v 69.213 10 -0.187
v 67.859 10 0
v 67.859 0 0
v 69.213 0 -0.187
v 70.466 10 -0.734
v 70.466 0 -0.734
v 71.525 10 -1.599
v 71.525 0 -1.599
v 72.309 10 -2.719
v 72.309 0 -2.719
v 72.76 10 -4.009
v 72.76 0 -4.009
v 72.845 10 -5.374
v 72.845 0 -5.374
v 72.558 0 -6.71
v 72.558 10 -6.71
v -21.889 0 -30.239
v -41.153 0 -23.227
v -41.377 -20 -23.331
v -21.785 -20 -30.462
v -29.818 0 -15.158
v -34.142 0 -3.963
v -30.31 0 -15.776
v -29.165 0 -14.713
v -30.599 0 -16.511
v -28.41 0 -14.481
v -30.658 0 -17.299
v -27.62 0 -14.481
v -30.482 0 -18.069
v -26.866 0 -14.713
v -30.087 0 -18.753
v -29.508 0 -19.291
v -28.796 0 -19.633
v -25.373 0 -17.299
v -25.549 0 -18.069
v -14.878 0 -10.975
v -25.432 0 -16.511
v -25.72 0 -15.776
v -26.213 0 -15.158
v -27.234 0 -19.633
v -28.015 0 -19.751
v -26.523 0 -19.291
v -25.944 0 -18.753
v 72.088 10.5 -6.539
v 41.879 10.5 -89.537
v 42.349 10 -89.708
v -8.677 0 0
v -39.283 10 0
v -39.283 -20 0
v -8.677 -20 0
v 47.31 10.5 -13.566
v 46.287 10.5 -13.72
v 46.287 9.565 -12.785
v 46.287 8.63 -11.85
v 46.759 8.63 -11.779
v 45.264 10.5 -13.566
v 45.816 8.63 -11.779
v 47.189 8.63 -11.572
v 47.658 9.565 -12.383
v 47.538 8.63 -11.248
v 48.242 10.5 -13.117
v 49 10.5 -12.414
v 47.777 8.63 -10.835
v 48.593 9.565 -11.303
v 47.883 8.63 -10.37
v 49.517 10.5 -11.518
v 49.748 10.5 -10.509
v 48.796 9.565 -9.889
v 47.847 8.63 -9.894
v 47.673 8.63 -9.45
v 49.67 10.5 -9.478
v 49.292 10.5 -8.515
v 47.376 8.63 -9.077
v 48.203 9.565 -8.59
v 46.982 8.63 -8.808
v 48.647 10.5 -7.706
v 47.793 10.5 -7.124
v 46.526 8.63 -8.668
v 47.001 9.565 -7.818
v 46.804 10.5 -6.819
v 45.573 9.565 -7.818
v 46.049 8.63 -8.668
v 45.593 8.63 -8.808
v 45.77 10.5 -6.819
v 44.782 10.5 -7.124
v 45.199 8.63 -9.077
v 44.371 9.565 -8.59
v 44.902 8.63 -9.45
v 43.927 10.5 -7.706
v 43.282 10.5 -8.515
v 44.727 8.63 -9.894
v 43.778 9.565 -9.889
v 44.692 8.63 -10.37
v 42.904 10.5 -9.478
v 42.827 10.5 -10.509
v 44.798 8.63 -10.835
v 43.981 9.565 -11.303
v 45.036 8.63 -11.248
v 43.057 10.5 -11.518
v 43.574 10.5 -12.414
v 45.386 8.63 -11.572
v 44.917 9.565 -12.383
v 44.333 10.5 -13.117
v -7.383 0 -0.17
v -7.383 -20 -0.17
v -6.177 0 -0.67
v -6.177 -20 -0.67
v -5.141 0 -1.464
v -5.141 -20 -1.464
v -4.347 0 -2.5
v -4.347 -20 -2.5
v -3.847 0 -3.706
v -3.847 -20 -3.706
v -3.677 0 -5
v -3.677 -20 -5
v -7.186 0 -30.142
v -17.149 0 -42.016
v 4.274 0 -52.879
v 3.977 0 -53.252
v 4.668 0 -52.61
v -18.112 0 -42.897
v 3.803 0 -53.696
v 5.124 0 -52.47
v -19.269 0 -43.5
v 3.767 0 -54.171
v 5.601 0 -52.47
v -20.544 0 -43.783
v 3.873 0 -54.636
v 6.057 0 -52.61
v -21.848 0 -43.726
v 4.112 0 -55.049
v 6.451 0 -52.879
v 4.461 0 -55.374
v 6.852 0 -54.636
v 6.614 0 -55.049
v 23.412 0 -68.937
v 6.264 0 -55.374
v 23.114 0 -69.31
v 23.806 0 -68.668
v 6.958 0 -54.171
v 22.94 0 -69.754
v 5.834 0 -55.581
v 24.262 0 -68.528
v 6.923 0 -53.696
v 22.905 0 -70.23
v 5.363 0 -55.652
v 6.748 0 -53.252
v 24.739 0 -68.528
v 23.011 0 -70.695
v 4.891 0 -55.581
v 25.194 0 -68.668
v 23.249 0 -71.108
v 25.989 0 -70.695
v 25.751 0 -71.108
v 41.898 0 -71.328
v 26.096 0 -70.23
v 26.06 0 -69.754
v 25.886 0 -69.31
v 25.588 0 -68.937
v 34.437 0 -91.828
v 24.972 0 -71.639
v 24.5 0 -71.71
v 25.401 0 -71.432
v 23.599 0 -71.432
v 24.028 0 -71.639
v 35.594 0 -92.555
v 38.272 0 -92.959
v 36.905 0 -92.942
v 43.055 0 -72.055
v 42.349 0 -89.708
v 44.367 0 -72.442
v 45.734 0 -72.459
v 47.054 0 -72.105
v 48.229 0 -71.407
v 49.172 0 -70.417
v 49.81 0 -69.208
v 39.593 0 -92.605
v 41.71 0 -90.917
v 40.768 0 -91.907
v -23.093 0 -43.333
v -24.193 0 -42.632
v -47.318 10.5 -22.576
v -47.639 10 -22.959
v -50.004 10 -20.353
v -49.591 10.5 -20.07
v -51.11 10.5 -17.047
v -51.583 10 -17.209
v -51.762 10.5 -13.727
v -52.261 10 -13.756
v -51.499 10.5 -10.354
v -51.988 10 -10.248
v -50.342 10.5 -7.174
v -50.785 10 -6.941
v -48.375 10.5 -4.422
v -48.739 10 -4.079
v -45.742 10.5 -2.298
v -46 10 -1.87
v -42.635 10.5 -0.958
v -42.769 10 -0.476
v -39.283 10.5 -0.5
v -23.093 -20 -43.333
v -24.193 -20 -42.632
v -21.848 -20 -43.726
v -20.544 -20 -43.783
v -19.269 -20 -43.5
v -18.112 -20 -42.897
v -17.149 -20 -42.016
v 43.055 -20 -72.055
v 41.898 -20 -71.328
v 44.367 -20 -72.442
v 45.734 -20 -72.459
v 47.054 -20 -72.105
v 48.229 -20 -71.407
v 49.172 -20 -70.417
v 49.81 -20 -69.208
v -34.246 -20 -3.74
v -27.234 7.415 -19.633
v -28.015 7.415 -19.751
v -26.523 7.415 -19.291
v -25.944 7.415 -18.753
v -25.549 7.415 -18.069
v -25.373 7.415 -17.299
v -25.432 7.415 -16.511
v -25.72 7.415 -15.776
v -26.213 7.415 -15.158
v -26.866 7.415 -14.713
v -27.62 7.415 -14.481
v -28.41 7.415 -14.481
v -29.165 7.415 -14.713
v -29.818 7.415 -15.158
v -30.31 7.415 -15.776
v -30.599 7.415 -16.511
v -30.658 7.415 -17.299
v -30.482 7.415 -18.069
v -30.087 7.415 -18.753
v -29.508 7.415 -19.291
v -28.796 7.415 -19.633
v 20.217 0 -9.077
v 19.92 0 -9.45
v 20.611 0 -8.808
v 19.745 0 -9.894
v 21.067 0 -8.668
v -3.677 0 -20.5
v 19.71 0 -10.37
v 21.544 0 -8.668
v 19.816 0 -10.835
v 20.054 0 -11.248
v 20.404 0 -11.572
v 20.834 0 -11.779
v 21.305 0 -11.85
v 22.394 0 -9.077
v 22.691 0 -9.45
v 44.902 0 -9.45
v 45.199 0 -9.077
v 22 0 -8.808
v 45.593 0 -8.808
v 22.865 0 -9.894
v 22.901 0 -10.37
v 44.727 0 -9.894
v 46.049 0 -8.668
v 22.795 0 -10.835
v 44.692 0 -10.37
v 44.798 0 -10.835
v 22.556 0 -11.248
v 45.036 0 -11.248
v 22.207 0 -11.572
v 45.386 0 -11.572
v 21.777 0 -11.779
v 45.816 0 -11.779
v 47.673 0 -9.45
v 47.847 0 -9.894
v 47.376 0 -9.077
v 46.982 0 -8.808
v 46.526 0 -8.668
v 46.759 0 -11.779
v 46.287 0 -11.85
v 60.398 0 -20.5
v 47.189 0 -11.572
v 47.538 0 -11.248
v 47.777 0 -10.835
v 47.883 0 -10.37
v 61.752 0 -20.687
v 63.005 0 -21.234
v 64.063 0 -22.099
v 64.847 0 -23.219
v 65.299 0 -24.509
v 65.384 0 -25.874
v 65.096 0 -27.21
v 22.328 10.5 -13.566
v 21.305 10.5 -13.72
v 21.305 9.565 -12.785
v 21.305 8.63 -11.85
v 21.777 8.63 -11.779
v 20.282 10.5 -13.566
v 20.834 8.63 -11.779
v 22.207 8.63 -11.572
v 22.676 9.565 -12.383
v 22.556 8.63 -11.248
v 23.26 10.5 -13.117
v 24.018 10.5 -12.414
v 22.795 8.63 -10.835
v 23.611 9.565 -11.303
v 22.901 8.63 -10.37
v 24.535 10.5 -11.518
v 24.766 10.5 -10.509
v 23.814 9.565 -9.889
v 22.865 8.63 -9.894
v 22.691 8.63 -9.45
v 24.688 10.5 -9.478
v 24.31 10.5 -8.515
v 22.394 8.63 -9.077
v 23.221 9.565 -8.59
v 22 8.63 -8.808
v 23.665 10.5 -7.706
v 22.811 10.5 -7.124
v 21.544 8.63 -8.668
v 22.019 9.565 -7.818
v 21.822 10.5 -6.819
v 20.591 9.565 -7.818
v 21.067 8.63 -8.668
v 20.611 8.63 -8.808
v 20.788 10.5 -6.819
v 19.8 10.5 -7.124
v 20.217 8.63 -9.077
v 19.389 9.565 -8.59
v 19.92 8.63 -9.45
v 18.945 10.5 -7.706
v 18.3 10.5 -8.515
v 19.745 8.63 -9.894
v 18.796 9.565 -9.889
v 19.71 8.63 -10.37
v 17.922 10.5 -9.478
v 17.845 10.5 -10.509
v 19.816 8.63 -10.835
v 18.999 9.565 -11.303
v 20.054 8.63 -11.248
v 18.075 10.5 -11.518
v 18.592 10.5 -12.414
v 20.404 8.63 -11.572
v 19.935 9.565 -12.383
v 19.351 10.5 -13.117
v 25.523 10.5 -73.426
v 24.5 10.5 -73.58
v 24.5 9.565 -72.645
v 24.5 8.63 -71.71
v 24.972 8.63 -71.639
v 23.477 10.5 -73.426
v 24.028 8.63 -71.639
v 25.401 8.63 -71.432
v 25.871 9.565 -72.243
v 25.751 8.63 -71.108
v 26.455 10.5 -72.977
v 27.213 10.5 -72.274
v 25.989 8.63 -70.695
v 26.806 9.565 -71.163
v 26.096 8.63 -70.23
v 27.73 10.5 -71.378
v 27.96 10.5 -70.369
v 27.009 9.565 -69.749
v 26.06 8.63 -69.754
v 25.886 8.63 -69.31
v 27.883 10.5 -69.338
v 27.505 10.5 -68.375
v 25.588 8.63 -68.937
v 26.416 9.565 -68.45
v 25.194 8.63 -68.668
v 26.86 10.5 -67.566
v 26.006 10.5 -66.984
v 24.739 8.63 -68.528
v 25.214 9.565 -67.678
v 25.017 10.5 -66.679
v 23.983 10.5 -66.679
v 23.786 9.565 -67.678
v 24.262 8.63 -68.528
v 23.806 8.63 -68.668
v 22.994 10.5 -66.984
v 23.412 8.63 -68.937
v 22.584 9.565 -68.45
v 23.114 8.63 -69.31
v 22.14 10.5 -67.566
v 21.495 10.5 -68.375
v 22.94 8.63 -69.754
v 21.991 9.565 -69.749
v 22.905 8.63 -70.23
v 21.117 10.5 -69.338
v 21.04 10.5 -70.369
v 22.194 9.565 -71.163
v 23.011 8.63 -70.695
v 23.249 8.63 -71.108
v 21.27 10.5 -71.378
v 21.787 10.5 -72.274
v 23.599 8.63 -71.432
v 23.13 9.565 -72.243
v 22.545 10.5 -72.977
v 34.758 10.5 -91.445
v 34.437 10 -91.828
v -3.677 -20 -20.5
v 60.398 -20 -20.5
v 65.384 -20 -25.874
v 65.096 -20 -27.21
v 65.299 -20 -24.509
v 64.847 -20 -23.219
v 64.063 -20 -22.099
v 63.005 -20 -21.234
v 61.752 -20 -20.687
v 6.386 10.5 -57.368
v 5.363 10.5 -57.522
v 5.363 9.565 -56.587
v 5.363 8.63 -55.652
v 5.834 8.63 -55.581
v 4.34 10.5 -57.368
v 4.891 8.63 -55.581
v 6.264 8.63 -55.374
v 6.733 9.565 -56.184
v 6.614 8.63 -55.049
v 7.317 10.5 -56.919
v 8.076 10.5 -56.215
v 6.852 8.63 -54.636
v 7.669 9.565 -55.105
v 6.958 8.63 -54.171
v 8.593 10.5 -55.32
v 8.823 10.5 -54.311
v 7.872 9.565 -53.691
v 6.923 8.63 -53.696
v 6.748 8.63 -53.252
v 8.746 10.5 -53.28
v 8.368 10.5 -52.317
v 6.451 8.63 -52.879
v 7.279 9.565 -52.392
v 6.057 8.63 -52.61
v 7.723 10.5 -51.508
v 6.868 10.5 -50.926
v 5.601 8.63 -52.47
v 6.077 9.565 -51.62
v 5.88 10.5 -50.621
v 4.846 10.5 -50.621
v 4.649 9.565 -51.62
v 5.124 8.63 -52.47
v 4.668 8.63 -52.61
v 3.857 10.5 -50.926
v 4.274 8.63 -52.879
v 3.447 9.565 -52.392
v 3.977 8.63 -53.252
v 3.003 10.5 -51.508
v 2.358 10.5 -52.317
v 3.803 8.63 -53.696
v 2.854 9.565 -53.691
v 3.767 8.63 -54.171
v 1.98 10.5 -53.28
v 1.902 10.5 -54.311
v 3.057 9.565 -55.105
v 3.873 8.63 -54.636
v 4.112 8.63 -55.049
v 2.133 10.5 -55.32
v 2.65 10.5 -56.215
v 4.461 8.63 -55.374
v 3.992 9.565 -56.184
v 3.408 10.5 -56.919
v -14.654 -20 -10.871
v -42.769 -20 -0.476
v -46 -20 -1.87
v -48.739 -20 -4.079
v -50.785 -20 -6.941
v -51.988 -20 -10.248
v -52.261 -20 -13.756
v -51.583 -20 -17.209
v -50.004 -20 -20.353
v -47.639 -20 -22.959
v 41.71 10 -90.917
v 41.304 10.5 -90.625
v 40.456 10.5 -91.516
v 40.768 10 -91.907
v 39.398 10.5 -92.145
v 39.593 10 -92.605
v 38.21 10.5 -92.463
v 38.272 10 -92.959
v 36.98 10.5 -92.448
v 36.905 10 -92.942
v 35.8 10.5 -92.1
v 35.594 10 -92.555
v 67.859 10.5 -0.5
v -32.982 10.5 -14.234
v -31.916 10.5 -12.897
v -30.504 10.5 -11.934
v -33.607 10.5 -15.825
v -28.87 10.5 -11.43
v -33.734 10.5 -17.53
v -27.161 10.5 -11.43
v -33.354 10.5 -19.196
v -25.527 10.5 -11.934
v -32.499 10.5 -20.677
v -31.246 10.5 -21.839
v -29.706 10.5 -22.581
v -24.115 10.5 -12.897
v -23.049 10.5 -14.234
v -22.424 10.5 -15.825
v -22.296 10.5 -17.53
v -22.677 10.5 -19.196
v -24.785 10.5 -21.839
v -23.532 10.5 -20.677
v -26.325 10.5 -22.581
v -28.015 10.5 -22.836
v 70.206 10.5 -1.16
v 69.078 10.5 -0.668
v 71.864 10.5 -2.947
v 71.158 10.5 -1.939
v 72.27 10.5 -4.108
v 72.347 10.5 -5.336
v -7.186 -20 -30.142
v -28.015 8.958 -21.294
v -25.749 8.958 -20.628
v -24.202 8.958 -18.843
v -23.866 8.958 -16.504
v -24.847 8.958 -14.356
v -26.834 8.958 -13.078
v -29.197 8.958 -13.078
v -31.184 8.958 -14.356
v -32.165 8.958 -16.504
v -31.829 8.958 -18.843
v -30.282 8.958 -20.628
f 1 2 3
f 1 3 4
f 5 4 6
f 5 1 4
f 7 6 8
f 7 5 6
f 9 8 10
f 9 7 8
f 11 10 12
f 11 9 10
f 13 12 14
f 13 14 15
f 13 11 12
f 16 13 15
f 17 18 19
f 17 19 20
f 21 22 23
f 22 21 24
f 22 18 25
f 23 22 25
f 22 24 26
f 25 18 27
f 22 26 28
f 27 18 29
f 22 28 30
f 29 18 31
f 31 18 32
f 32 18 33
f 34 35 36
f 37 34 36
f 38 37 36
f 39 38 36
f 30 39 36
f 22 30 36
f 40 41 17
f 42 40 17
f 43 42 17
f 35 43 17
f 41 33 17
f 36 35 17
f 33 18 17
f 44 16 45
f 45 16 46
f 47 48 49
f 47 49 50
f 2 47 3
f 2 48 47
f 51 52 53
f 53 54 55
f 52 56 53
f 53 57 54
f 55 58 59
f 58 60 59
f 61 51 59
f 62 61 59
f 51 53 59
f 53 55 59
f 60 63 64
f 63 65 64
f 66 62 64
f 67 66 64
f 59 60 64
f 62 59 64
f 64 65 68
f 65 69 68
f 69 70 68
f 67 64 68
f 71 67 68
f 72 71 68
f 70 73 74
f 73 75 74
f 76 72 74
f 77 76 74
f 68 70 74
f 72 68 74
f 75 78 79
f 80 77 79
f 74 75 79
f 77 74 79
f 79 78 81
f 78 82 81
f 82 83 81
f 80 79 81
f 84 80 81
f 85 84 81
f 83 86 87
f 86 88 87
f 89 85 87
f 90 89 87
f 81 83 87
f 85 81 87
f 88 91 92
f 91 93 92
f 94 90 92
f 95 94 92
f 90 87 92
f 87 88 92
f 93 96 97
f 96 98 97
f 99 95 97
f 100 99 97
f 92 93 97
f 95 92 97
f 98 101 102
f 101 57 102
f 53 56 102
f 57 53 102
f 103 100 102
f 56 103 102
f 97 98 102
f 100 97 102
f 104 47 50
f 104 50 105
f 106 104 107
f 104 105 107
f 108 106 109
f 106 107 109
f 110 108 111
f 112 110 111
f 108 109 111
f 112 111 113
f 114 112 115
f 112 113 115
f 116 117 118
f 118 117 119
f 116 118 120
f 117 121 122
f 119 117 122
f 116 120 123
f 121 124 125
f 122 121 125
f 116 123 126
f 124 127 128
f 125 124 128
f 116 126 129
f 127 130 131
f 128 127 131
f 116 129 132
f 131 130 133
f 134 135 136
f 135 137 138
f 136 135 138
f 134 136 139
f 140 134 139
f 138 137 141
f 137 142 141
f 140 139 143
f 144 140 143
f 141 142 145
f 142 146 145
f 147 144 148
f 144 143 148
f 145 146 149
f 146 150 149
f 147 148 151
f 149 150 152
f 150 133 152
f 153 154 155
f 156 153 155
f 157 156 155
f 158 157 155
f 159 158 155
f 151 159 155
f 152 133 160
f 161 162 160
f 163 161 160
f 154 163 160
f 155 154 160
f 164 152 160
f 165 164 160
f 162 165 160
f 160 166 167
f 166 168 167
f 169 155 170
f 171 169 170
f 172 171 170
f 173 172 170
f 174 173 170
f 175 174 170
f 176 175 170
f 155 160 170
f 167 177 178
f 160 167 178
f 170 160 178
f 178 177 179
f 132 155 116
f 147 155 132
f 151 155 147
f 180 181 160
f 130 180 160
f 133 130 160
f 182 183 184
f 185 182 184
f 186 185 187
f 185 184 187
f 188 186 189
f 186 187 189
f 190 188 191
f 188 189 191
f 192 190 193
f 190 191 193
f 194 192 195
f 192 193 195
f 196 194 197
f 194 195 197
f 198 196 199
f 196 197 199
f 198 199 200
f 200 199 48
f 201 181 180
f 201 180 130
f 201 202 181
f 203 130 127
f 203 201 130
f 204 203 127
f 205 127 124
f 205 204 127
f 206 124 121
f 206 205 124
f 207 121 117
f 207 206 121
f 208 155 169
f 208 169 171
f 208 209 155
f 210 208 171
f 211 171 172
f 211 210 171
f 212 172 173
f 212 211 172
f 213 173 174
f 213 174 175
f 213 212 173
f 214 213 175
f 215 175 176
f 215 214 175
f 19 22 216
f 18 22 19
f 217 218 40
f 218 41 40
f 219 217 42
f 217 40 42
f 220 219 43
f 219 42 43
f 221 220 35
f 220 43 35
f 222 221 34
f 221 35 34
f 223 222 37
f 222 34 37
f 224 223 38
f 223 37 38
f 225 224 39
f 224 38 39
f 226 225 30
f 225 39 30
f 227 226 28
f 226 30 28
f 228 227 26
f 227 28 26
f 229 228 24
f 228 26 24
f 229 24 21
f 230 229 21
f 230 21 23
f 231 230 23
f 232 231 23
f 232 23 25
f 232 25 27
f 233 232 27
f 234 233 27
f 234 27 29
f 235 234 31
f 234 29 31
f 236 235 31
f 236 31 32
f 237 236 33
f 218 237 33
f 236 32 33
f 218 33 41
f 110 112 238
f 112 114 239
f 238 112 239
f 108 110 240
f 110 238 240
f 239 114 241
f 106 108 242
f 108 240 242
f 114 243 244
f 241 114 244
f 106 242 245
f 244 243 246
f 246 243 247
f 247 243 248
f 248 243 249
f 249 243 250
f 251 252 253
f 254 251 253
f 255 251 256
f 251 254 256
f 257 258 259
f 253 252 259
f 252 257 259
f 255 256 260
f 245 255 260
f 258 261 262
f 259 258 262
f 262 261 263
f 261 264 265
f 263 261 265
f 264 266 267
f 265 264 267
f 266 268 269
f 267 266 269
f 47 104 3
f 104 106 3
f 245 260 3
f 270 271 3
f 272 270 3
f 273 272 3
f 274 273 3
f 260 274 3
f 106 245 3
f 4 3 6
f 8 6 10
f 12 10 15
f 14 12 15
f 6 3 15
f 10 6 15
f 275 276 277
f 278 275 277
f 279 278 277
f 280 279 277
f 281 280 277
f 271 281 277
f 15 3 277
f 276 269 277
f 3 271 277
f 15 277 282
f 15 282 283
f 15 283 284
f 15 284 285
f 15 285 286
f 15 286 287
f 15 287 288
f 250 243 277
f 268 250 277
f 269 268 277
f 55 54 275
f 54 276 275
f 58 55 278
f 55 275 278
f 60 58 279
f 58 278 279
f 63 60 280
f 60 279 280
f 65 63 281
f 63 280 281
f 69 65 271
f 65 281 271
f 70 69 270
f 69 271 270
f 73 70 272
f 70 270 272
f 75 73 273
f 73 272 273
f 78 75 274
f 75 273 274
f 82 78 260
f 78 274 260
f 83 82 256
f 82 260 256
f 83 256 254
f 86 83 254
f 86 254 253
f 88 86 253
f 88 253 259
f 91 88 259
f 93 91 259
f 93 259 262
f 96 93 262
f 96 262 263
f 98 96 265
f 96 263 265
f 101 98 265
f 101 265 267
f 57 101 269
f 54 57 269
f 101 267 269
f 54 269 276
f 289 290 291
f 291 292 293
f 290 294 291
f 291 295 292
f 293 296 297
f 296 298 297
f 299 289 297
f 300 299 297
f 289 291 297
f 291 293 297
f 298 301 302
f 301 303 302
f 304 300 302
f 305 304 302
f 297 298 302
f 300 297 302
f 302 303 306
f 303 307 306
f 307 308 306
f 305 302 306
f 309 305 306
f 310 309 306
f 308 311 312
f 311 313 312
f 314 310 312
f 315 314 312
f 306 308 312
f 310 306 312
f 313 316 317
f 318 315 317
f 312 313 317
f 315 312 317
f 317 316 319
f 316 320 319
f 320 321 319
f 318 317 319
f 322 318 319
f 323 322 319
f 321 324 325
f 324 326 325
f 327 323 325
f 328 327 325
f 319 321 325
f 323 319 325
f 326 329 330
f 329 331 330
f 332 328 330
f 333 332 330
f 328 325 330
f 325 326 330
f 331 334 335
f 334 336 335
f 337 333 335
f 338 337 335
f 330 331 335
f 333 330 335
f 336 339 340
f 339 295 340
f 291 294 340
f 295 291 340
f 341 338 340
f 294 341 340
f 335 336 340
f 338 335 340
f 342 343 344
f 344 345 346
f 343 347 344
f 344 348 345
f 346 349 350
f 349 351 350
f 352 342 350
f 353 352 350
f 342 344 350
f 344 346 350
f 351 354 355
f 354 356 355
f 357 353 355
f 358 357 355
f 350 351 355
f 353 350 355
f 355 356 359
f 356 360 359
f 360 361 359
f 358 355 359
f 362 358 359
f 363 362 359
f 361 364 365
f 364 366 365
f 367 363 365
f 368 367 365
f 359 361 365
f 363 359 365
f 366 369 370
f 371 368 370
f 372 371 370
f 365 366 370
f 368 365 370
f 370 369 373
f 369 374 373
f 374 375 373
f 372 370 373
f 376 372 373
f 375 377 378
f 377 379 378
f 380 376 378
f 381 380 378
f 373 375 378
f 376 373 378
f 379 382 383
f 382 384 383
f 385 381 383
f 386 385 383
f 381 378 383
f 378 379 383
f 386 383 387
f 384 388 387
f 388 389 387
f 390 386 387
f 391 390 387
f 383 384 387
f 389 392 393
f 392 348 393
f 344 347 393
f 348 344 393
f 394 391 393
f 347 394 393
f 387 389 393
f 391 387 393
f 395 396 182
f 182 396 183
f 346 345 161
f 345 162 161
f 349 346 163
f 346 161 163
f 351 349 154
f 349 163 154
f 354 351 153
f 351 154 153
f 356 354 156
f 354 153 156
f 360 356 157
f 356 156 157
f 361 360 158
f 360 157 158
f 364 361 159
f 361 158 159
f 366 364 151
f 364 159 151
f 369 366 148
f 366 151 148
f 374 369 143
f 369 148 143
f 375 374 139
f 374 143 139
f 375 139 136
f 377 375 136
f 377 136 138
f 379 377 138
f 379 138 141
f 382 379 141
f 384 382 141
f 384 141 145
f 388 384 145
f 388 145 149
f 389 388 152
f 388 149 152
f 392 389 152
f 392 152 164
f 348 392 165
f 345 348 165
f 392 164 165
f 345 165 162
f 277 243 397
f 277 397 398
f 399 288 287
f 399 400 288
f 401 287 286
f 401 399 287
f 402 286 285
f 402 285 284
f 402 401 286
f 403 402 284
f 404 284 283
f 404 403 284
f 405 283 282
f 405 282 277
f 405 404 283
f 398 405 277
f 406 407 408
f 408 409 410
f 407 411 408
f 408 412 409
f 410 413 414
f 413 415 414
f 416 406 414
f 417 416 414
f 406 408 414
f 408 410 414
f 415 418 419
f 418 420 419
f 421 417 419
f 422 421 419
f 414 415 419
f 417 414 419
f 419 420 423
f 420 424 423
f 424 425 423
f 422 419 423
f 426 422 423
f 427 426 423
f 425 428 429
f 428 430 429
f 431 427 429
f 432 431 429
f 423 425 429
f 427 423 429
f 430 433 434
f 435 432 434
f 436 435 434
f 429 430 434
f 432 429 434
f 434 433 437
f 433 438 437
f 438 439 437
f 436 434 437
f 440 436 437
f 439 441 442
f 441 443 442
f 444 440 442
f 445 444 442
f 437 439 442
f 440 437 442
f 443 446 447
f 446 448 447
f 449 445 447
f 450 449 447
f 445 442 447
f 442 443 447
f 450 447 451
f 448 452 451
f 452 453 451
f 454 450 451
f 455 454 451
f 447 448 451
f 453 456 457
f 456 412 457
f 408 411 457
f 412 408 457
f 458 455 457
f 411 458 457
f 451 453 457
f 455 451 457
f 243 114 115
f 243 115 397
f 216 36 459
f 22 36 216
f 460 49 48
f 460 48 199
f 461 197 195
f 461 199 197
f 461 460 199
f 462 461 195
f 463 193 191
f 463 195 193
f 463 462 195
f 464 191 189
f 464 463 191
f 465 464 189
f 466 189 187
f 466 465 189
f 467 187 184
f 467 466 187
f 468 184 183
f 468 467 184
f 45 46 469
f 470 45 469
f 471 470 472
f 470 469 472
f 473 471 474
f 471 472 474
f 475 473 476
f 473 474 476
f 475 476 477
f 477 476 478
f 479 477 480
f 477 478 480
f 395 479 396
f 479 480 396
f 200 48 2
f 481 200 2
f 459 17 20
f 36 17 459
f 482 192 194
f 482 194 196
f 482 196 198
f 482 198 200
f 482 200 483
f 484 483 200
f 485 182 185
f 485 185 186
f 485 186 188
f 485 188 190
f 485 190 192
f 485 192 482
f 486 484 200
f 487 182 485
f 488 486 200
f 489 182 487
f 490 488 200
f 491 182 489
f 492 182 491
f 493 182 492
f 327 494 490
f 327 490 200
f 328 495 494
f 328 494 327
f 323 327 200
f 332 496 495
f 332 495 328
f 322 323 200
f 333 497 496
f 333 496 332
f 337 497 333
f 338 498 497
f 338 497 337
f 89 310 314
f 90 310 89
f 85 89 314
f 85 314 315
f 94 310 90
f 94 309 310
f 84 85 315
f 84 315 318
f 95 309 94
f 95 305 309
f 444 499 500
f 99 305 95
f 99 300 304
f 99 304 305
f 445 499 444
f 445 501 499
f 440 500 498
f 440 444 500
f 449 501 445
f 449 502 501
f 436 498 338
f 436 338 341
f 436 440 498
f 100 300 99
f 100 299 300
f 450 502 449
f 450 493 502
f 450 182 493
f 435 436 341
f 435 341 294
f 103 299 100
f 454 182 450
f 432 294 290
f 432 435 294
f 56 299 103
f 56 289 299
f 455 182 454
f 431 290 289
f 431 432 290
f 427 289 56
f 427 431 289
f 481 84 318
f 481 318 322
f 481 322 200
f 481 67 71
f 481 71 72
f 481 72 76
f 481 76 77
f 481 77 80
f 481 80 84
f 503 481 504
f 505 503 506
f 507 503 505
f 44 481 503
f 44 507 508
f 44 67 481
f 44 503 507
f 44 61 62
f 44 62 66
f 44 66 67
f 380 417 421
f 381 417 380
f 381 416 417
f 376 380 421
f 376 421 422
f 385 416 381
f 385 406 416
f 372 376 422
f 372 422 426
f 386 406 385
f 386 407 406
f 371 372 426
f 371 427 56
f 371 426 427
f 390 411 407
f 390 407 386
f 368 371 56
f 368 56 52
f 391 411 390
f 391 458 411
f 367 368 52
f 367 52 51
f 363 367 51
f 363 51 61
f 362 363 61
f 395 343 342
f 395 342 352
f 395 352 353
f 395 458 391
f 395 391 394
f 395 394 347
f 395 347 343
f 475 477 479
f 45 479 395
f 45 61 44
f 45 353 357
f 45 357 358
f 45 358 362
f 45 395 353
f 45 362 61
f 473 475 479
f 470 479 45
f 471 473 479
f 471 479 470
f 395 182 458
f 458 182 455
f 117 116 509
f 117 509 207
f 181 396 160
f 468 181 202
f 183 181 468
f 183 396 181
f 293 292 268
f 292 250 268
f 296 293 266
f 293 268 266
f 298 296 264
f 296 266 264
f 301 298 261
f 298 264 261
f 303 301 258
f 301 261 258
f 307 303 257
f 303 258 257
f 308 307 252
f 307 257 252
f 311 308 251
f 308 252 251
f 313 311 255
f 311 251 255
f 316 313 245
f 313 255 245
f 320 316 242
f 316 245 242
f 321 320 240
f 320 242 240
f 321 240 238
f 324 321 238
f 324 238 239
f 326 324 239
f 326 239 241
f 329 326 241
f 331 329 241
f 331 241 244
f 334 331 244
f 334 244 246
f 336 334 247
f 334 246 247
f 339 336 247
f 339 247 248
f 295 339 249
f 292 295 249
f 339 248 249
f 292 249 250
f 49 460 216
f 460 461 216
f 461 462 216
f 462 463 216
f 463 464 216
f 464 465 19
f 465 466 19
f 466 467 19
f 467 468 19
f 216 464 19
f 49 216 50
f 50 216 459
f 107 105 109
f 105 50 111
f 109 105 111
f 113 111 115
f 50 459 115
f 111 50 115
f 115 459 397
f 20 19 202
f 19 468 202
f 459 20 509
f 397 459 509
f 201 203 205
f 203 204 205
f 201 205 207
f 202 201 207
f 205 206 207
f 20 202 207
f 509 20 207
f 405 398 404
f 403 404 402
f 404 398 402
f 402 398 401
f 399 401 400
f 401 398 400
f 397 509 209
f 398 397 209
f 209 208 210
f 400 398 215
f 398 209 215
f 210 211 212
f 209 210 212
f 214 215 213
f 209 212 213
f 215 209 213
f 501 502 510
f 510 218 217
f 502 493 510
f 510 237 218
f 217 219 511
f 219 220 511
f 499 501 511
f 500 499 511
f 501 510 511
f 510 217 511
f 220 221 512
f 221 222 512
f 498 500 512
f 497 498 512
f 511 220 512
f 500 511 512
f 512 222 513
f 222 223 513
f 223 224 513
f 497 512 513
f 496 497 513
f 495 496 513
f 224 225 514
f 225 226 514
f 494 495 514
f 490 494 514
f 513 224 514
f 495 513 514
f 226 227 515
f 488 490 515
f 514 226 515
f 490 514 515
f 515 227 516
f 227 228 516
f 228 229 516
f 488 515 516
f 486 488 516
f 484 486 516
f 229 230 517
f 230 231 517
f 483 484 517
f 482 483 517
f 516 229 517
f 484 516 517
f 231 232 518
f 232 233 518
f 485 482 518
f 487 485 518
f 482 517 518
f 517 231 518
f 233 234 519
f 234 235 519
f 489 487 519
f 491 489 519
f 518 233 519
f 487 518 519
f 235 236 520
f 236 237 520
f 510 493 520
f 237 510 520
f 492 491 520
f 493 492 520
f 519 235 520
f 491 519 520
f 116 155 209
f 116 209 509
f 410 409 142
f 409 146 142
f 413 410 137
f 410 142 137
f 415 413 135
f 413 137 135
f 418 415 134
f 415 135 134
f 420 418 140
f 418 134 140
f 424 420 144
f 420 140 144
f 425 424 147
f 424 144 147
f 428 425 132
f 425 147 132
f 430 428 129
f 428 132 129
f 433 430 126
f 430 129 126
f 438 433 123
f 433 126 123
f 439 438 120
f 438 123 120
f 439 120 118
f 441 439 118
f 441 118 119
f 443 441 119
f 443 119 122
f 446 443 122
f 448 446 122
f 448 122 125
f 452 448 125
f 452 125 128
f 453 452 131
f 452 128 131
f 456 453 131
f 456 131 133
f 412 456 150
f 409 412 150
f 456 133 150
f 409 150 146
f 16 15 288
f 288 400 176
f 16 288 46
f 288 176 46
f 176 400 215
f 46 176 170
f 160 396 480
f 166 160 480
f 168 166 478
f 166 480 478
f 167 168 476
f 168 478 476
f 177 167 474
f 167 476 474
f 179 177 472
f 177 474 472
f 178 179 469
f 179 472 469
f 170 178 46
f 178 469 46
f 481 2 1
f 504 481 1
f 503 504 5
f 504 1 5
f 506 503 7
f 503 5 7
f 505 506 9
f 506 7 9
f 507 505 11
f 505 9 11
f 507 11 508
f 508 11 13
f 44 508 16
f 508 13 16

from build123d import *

# Parameters (mm, degrees)
SKETCH1_R                                            = 1.0000000000000018
SKETCH1_R_2                                          = 1.0000000000000087
SKETCH1_R_3                                          = 0.9999999999999911
SKETCH1_R_4                                          = 1.000000000000005
SKETCH1_R_5                                          = 0.9999999999999983
MAIN_BODY_DEPTH                                      = 10.5
PROFILE_STOPS_DEPTH                                  = 20
CSK_FOR_M3_HEX_SOCKET_COUNTERSUNK_HEAD_S_D           = 3.2
CSK_FOR_M3_HEX_SOCKET_COUNTERSUNK_HEAD_S_DEPTH       = 30.5
CSK_FOR_M3_HEX_SOCKET_COUNTERSUNK_HEAD_S_CSINK_D     = 6.94
CSK_FOR_M3_HEX_SOCKET_COUNTERSUNK_HEAD_S_CSINK_ANGLE = 90
CSK_FOR_M5_HEX_SOCKET_COUNTERSUNK_HEAD_S_D           = 5.3
CSK_FOR_M5_HEX_SOCKET_COUNTERSUNK_HEAD_S_DEPTH       = 30.5
CSK_FOR_M5_HEX_SOCKET_COUNTERSUNK_HEAD_S_CSINK_D     = 11.47
CSK_FOR_M5_HEX_SOCKET_COUNTERSUNK_HEAD_S_CSINK_ANGLE = 90
FILLET1_R                                            = 5
FILLET3_R                                            = 5
FILLET4_R                                            = 13
DRAFT1_ANGLE                                         = 0.5000000000000011
CHAMFER1_SIZE                                        = 0.5


with BuildPart() as part:
    # Sketch1 → Main Body (new body)
    with BuildSketch(Plane(origin=(0, 0, 0), x_dir=(1, 0, 0), z_dir=(0, 1, 0))):
        Polygon((-75, 0), (75, 2.755e-14), (39.90666646784656, 96.41814145298106), align=None)
        with Locations(Location((-28.015368960704585, 17.101007166283473, 0), (0, 0, 90))):
            Circle(SKETCH1_R, mode=Mode.SUBTRACT)
        with Locations(Location((21.305293098803567, 10.25, 0), (0, 0, 90))):
            Circle(SKETCH1_R_2, mode=Mode.SUBTRACT)
        with Locations(Location((46.28729909878749, 10.25, 0), (0, 0, 90))):
            Circle(SKETCH1_R_3, mode=Mode.SUBTRACT)
        with Locations(Location((5.362707620569896, 54.05189360917208, 0), (0, 0, 90))):
            Circle(SKETCH1_R_4, mode=Mode.SUBTRACT)
        with Locations(Location((24.500034494822536, 70.11001753107655, 0), (0, 0, 90))):
            Circle(SKETCH1_R_5, mode=Mode.SUBTRACT)
    extrude(amount=MAIN_BODY_DEPTH)

    # Sketch1<3> → Profile Stops (add)
    with BuildSketch(Plane(origin=(0, 0, 0), x_dir=(1, 0, 0), z_dir=(0, 1, 0))):
        Polygon((-75, 0), (-3.676712901180352, 1.84e-15), (-3.67671290118036, 20.5), (67.53861019754284, 20.5), (47.36805627030374, 75.91814145298105), (-7.186046254395704, 30.141814145298103), (-20.363192252969785, 45.84572522923713), align=None)
        Polygon((-41.15292479284825, 23.22715006025093), (-21.889226066737145, 30.238562998427152), (-14.877813128560916, 10.974864272316022), (-34.14151185467204, 3.9634513341398048), align=None, mode=Mode.SUBTRACT)
    extrude(amount=-PROFILE_STOPS_DEPTH)

    # CSK for M3 Hex Socket Countersunk Head Screw1
    with Locations(Plane(origin=(24.500034495, 10.5, -70.110017531), x_dir=(0, 0, 1), z_dir=(0, 1, 0))):
        with Locations((0, 0), (16.058123922, -19.137326874), (59.860017531, 21.787264604), (59.860017531, -3.194741396)):
            CounterSinkHole(CSK_FOR_M3_HEX_SOCKET_COUNTERSUNK_HEAD_S_D / 2, CSK_FOR_M3_HEX_SOCKET_COUNTERSUNK_HEAD_S_CSINK_D / 2, depth=CSK_FOR_M3_HEX_SOCKET_COUNTERSUNK_HEAD_S_DEPTH, counter_sink_angle=CSK_FOR_M3_HEX_SOCKET_COUNTERSUNK_HEAD_S_CSINK_ANGLE)

    # CSK for M5 Hex Socket Countersunk Head Screw1
    with Locations(Plane(origin=(-28.015368961, 10.5, -17.101007166), x_dir=(0, 0, 1), z_dir=(0, 1, 0))):
        with Locations((0, 0)):
            CounterSinkHole(CSK_FOR_M5_HEX_SOCKET_COUNTERSUNK_HEAD_S_D / 2, CSK_FOR_M5_HEX_SOCKET_COUNTERSUNK_HEAD_S_CSINK_D / 2, depth=CSK_FOR_M5_HEX_SOCKET_COUNTERSUNK_HEAD_S_DEPTH, counter_sink_angle=CSK_FOR_M5_HEX_SOCKET_COUNTERSUNK_HEAD_S_CSINK_ANGLE)

    # Fillet1
    fillet1_edges = [part.edges().sort_by_distance(p)[0] for p in [
        (-3.676712901180355, -10, -2.69e-15),
        (-20.363192252969785, -10, -45.84572522923713),
    ]]
    fillet(fillet1_edges, radius=FILLET1_R)

    # Fillet3
    fillet3_edges = [part.edges().sort_by_distance(p)[0] for p in [
        (75, 5.25, -2.755e-14),
        (39.90666646784656, 5.25, -96.41814145298106),
        (47.36805627030374, -10, -75.91814145298105),
        (67.53861019754285, -10, -20.5),
    ]]
    fillet(fillet3_edges, radius=FILLET3_R)

    # Fillet4
    fillet4_edges = [part.edges().sort_by_distance(p)[0] for p in [
        (-75, -4.75, 0),
    ]]
    fillet(fillet4_edges, radius=FILLET4_R)

    # Draft1
    draft1_faces = [part.faces().sort_by_distance(p)[0] for p in [
        (-31.521075429792702, -10, -26.732856529339042),
        (-18.38351959764903, -10, -20.606713635371584),
        (-37.64721832376015, -10, -13.59530069719537),
        (-24.509662491616478, -10, -7.469157803227914),
    ]]
    draft(draft1_faces, Plane(origin=(0, 0, 0), x_dir=(0, 0, -1), z_dir=(0, -1, 0)), DRAFT1_ANGLE)

    # Chamfer1
    chamfer1_edges = [part.edges().sort_by_distance(p)[0] for p in [
        (57.45333323392328, 10.5, -48.209070726490545),
        (38.94457551921066, 10.5, -92.82756915116973),
        (71.9550201877344, 10.5, -2.1321178182447977),
        (14.288233209599724, 10.5, -1.64e-14),
        (-6.601245113874818, 10.5, -57.39336999793299),
        (-51.498797617306785, 10.5, -8.553738136766313),
    ]]
    chamfer(chamfer1_edges, length=CHAMFER1_SIZE)


solid = part.part
